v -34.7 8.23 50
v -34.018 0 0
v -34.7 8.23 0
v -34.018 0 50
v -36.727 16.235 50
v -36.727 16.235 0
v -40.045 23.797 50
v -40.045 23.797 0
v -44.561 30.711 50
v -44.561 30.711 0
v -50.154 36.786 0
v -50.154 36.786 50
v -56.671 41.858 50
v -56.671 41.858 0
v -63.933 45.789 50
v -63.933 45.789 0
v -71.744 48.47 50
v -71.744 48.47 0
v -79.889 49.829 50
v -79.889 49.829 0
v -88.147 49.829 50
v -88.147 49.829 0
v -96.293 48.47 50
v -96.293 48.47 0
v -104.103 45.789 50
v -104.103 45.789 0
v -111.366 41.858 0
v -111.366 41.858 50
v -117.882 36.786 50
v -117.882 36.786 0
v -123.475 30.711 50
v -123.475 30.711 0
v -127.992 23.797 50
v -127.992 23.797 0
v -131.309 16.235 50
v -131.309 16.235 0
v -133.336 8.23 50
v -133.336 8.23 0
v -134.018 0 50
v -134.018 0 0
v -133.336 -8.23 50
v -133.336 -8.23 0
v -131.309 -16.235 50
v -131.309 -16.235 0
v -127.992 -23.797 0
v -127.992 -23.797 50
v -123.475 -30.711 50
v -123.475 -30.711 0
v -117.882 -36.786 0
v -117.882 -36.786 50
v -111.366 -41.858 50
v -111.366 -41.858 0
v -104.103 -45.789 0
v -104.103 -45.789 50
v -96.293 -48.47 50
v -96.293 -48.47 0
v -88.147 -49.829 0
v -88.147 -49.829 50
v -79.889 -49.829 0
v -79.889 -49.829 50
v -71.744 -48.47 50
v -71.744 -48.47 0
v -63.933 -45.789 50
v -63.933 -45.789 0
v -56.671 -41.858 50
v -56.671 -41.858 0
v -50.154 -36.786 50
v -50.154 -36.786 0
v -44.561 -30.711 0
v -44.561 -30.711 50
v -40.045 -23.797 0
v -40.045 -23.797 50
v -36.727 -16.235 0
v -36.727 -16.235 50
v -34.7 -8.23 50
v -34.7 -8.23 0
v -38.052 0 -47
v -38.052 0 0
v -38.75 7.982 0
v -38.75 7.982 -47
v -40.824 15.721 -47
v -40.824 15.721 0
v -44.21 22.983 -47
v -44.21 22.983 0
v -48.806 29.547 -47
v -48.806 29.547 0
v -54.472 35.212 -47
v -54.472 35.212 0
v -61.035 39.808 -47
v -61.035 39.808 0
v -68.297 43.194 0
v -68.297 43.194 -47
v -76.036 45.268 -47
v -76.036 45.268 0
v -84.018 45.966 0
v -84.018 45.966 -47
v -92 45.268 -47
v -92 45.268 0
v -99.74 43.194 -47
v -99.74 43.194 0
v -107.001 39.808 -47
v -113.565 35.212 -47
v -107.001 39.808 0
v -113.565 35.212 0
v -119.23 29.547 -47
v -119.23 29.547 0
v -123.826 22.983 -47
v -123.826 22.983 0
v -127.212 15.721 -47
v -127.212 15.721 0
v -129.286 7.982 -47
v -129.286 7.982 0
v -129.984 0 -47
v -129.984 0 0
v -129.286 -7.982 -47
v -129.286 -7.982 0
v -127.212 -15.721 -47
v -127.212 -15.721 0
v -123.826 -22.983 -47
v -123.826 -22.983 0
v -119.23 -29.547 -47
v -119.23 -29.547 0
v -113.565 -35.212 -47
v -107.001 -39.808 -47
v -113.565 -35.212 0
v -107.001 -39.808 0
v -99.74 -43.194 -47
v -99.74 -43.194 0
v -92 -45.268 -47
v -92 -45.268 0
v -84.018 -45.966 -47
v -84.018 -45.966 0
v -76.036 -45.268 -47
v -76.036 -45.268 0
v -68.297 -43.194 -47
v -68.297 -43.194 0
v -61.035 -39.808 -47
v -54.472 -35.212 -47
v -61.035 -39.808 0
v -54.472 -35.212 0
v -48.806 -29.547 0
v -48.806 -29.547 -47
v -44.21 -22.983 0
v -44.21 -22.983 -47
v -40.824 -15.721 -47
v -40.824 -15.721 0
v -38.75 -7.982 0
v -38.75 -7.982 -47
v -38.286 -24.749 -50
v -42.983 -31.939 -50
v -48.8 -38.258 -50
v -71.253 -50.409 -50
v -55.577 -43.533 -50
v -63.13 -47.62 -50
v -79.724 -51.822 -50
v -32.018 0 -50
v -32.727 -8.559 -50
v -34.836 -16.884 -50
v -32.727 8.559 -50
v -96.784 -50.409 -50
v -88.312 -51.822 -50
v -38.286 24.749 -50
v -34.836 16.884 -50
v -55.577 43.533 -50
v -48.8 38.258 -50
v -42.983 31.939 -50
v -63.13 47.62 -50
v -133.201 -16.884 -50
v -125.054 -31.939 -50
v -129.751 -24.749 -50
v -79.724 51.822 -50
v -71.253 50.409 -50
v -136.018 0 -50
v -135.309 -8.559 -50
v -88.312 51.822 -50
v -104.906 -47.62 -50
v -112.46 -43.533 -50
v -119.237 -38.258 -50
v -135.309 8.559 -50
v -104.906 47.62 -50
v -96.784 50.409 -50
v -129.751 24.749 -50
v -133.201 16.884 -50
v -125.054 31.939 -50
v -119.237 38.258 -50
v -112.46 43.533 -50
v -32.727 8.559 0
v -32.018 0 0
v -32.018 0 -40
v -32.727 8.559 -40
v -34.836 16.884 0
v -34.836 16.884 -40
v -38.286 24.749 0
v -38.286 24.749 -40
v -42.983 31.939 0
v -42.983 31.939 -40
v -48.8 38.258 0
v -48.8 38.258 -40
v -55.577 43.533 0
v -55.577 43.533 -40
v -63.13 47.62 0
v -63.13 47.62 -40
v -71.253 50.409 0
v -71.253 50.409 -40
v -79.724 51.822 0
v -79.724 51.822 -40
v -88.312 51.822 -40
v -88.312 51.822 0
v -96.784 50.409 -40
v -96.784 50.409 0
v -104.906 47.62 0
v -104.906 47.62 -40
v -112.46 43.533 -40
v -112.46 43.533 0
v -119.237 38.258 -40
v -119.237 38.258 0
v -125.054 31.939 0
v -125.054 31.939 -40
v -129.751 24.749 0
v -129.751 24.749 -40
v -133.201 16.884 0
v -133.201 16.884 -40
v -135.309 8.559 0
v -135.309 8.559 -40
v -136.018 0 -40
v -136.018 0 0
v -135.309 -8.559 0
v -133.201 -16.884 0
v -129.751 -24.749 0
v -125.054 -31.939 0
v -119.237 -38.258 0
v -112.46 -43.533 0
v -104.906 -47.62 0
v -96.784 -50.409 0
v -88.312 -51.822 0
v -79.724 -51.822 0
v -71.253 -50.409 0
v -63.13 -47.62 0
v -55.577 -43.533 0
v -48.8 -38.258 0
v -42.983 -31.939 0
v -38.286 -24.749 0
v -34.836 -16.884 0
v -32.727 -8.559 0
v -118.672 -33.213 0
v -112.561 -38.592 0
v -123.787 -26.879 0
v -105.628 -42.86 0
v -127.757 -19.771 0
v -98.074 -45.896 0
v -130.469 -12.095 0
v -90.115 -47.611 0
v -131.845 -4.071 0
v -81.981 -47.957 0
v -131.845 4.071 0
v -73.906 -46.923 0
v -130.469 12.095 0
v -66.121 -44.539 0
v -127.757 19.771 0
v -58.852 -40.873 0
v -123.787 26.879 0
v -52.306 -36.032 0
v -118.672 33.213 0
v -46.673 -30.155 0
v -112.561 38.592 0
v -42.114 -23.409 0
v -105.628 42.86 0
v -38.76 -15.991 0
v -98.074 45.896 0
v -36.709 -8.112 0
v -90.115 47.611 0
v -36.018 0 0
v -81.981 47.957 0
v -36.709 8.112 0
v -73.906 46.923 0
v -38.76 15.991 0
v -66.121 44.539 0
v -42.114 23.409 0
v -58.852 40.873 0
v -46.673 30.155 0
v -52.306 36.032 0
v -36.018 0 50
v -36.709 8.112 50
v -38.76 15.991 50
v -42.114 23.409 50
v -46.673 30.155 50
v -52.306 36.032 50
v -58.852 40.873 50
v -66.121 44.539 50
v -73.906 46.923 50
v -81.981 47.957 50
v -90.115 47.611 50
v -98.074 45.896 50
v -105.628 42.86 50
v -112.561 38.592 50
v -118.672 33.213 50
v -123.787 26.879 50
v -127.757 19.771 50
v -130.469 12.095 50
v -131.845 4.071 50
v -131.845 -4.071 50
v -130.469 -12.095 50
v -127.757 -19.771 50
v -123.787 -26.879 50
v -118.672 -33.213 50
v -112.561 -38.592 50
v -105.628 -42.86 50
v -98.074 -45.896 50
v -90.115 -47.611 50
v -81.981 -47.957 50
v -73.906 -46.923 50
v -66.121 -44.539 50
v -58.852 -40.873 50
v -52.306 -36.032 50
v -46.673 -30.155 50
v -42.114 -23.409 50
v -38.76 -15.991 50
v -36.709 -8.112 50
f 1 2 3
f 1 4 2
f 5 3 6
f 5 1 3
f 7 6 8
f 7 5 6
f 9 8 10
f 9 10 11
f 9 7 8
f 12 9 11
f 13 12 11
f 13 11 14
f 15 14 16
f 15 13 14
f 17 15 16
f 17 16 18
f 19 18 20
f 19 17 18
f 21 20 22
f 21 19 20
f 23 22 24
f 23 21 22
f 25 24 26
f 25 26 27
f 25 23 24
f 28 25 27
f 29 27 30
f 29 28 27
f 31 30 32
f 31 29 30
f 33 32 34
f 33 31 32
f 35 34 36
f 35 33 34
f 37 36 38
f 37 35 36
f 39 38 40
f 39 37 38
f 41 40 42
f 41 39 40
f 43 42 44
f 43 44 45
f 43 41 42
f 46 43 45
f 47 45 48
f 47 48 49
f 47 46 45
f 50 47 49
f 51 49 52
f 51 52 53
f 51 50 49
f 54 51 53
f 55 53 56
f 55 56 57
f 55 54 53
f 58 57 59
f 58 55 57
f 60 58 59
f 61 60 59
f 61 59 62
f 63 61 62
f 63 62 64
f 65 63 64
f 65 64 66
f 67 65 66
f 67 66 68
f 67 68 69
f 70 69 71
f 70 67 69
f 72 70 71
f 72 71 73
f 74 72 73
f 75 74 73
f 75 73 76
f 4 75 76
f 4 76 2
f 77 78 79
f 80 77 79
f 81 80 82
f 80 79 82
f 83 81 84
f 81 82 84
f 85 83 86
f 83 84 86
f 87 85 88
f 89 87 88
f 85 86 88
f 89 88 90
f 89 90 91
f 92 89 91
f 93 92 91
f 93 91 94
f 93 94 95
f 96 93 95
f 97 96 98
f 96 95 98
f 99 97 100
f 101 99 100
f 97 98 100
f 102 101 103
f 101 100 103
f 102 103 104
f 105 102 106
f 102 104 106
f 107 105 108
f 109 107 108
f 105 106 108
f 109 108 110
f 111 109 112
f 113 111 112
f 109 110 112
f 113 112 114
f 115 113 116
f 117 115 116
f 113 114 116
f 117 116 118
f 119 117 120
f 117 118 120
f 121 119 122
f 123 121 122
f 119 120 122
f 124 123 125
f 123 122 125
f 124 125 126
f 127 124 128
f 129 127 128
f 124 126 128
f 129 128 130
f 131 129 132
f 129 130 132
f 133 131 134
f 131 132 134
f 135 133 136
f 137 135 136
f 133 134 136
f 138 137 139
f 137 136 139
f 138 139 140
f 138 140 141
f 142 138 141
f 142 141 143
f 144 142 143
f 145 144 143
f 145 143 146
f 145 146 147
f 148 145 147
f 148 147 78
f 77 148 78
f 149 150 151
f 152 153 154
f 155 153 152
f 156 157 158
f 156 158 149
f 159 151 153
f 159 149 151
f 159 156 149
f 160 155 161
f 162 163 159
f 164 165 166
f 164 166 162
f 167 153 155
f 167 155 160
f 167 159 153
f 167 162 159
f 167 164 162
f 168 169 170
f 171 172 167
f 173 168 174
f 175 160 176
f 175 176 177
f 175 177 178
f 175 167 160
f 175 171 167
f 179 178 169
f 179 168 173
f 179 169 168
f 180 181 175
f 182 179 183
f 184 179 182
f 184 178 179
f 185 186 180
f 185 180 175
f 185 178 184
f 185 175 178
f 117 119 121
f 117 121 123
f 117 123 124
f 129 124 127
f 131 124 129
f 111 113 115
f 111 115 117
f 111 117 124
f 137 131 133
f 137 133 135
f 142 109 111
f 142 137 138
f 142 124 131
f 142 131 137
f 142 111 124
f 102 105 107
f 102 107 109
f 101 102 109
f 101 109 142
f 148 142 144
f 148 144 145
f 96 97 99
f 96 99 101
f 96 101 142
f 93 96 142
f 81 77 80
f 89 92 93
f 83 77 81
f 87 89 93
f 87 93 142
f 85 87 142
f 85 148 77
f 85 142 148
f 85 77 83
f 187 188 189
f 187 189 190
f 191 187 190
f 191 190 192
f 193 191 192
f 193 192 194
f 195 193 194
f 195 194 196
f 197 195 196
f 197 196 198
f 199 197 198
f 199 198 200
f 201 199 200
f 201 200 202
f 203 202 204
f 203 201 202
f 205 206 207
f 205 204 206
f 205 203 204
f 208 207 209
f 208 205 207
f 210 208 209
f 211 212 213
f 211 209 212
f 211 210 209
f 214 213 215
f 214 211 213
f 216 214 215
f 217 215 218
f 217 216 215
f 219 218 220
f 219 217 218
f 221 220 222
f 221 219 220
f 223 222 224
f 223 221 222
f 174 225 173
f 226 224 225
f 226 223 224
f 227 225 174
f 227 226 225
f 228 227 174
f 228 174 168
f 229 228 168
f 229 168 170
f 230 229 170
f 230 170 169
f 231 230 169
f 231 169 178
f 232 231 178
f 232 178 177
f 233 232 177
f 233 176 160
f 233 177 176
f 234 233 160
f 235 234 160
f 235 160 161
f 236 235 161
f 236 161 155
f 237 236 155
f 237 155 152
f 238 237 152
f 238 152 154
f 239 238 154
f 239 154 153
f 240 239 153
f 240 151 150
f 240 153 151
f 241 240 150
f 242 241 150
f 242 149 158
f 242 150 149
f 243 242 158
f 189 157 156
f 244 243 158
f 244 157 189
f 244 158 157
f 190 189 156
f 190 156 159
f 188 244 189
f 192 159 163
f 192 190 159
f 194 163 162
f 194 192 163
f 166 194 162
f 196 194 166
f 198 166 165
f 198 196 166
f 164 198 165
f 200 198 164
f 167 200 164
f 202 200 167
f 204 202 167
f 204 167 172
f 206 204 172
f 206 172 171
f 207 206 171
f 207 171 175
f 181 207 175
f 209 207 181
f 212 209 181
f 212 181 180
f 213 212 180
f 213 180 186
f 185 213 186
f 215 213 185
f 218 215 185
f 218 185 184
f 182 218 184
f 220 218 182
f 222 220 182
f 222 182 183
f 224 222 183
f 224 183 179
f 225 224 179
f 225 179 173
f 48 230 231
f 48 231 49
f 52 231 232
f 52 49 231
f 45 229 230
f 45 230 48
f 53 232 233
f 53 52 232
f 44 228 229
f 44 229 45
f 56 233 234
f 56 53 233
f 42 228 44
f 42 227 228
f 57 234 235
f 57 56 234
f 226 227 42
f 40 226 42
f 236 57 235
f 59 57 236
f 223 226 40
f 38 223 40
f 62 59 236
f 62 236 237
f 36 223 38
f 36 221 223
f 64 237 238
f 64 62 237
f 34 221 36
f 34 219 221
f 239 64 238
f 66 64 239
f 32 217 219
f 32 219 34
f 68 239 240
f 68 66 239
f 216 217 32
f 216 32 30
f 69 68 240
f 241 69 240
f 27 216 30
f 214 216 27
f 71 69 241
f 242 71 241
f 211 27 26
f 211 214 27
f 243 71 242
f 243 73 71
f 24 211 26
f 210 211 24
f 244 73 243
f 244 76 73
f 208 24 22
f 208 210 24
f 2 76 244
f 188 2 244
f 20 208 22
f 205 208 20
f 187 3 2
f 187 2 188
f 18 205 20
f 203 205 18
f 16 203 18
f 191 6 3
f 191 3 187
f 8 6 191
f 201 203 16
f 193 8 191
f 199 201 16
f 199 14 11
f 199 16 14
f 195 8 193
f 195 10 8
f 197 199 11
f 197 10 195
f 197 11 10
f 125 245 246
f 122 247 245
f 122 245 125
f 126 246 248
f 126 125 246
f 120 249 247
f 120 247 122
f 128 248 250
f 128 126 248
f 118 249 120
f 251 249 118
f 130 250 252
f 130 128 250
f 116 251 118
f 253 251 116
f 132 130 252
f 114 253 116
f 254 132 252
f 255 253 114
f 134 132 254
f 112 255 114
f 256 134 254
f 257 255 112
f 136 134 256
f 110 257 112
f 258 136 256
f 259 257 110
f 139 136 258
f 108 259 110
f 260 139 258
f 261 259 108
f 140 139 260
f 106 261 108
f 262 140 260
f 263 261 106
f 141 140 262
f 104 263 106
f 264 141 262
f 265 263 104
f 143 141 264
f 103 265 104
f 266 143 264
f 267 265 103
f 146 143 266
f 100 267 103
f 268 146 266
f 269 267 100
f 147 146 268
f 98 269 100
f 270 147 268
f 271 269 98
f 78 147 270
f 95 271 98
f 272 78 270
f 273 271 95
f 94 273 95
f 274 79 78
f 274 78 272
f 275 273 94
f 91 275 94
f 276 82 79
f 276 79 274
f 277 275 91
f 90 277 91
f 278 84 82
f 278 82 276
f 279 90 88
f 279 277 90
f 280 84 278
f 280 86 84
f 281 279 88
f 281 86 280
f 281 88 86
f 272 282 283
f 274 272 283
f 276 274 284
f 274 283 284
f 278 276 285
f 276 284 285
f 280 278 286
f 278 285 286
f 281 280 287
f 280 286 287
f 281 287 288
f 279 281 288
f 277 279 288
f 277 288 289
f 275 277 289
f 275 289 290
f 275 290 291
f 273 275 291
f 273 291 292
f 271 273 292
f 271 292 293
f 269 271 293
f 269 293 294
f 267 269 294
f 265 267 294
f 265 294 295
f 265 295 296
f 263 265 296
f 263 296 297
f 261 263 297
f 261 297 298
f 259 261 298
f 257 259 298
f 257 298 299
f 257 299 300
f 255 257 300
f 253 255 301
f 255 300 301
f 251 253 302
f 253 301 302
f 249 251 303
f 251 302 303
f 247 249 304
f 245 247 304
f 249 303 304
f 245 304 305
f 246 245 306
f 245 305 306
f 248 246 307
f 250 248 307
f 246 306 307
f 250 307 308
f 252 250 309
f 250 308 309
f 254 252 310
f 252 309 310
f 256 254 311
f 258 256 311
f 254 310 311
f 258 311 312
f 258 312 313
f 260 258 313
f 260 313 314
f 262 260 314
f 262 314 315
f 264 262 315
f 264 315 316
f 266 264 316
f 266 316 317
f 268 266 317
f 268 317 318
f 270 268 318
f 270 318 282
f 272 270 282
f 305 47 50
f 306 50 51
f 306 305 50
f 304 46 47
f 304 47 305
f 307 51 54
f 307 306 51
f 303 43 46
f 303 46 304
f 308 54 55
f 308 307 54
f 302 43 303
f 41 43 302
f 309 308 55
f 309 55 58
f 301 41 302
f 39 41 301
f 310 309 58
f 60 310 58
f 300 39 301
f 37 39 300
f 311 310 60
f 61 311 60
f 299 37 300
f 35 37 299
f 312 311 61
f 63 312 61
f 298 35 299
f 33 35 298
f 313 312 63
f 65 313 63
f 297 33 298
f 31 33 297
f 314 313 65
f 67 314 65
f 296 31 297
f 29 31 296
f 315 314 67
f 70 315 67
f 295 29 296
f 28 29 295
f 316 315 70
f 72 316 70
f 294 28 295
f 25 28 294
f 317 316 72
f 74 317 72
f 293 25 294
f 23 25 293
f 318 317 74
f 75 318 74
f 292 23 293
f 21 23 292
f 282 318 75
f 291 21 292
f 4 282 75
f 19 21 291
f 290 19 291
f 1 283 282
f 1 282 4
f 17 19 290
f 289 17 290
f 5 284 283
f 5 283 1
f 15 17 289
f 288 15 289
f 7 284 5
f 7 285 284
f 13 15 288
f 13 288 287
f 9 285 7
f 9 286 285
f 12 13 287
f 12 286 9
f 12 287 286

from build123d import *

# Parameters (mm, degrees)
CROQUIS1_R              = 50
SALIENTE_EXTRUIR1_DEPTH = 50
CROQUIS2_R              = 52
SALIENTE_EXTRUIR2_DEPTH = 10
CROQUIS3_R              = 48
CORTAR_EXTRUIR1_DEPTH   = 97
CROQUIS4_R              = 52
SALIENTE_EXTRUIR3_DEPTH = 47
CROQUIS5_R              = 45.966217712
CORTAR_EXTRUIR2_DEPTH   = 47


with BuildPart() as part:
    # Croquis1 → Saliente-Extruir1 (new body, symmetric)
    with BuildSketch(Plane.XY):
        with Locations((-84.01826484, 0)):
            Circle(CROQUIS1_R)
    extrude(amount=SALIENTE_EXTRUIR1_DEPTH, both=True)

    # Croquis2 → Saliente-Extruir2 (add)
    with BuildSketch(Plane(origin=(0, 0, -50), x_dir=(-1, 0, 0), z_dir=(0, 0, -1))):
        with Locations((84.01826484, 0)):
            Circle(CROQUIS2_R)
    extrude(amount=-SALIENTE_EXTRUIR2_DEPTH)

    # Croquis3 → Cortar-Extruir1 (cut)
    with BuildSketch(Plane.XY.offset(50)):
        with Locations((-84.01826484, 0)):
            Circle(CROQUIS3_R)
    extrude(amount=-CORTAR_EXTRUIR1_DEPTH, mode=Mode.SUBTRACT)

    # Croquis4 → Saliente-Extruir3 (add)
    with BuildSketch(Plane.XY):
        with Locations((-84.01826484, 0)):
            Circle(CROQUIS4_R)
    extrude(amount=-SALIENTE_EXTRUIR3_DEPTH)

    # Croquis5 → Cortar-Extruir2 (cut)
    with BuildSketch(Plane.XY):
        with Locations((-84.01826484, 0)):
            Circle(CROQUIS5_R)
    extrude(amount=-CORTAR_EXTRUIR2_DEPTH, mode=Mode.SUBTRACT)


solid = part.part
